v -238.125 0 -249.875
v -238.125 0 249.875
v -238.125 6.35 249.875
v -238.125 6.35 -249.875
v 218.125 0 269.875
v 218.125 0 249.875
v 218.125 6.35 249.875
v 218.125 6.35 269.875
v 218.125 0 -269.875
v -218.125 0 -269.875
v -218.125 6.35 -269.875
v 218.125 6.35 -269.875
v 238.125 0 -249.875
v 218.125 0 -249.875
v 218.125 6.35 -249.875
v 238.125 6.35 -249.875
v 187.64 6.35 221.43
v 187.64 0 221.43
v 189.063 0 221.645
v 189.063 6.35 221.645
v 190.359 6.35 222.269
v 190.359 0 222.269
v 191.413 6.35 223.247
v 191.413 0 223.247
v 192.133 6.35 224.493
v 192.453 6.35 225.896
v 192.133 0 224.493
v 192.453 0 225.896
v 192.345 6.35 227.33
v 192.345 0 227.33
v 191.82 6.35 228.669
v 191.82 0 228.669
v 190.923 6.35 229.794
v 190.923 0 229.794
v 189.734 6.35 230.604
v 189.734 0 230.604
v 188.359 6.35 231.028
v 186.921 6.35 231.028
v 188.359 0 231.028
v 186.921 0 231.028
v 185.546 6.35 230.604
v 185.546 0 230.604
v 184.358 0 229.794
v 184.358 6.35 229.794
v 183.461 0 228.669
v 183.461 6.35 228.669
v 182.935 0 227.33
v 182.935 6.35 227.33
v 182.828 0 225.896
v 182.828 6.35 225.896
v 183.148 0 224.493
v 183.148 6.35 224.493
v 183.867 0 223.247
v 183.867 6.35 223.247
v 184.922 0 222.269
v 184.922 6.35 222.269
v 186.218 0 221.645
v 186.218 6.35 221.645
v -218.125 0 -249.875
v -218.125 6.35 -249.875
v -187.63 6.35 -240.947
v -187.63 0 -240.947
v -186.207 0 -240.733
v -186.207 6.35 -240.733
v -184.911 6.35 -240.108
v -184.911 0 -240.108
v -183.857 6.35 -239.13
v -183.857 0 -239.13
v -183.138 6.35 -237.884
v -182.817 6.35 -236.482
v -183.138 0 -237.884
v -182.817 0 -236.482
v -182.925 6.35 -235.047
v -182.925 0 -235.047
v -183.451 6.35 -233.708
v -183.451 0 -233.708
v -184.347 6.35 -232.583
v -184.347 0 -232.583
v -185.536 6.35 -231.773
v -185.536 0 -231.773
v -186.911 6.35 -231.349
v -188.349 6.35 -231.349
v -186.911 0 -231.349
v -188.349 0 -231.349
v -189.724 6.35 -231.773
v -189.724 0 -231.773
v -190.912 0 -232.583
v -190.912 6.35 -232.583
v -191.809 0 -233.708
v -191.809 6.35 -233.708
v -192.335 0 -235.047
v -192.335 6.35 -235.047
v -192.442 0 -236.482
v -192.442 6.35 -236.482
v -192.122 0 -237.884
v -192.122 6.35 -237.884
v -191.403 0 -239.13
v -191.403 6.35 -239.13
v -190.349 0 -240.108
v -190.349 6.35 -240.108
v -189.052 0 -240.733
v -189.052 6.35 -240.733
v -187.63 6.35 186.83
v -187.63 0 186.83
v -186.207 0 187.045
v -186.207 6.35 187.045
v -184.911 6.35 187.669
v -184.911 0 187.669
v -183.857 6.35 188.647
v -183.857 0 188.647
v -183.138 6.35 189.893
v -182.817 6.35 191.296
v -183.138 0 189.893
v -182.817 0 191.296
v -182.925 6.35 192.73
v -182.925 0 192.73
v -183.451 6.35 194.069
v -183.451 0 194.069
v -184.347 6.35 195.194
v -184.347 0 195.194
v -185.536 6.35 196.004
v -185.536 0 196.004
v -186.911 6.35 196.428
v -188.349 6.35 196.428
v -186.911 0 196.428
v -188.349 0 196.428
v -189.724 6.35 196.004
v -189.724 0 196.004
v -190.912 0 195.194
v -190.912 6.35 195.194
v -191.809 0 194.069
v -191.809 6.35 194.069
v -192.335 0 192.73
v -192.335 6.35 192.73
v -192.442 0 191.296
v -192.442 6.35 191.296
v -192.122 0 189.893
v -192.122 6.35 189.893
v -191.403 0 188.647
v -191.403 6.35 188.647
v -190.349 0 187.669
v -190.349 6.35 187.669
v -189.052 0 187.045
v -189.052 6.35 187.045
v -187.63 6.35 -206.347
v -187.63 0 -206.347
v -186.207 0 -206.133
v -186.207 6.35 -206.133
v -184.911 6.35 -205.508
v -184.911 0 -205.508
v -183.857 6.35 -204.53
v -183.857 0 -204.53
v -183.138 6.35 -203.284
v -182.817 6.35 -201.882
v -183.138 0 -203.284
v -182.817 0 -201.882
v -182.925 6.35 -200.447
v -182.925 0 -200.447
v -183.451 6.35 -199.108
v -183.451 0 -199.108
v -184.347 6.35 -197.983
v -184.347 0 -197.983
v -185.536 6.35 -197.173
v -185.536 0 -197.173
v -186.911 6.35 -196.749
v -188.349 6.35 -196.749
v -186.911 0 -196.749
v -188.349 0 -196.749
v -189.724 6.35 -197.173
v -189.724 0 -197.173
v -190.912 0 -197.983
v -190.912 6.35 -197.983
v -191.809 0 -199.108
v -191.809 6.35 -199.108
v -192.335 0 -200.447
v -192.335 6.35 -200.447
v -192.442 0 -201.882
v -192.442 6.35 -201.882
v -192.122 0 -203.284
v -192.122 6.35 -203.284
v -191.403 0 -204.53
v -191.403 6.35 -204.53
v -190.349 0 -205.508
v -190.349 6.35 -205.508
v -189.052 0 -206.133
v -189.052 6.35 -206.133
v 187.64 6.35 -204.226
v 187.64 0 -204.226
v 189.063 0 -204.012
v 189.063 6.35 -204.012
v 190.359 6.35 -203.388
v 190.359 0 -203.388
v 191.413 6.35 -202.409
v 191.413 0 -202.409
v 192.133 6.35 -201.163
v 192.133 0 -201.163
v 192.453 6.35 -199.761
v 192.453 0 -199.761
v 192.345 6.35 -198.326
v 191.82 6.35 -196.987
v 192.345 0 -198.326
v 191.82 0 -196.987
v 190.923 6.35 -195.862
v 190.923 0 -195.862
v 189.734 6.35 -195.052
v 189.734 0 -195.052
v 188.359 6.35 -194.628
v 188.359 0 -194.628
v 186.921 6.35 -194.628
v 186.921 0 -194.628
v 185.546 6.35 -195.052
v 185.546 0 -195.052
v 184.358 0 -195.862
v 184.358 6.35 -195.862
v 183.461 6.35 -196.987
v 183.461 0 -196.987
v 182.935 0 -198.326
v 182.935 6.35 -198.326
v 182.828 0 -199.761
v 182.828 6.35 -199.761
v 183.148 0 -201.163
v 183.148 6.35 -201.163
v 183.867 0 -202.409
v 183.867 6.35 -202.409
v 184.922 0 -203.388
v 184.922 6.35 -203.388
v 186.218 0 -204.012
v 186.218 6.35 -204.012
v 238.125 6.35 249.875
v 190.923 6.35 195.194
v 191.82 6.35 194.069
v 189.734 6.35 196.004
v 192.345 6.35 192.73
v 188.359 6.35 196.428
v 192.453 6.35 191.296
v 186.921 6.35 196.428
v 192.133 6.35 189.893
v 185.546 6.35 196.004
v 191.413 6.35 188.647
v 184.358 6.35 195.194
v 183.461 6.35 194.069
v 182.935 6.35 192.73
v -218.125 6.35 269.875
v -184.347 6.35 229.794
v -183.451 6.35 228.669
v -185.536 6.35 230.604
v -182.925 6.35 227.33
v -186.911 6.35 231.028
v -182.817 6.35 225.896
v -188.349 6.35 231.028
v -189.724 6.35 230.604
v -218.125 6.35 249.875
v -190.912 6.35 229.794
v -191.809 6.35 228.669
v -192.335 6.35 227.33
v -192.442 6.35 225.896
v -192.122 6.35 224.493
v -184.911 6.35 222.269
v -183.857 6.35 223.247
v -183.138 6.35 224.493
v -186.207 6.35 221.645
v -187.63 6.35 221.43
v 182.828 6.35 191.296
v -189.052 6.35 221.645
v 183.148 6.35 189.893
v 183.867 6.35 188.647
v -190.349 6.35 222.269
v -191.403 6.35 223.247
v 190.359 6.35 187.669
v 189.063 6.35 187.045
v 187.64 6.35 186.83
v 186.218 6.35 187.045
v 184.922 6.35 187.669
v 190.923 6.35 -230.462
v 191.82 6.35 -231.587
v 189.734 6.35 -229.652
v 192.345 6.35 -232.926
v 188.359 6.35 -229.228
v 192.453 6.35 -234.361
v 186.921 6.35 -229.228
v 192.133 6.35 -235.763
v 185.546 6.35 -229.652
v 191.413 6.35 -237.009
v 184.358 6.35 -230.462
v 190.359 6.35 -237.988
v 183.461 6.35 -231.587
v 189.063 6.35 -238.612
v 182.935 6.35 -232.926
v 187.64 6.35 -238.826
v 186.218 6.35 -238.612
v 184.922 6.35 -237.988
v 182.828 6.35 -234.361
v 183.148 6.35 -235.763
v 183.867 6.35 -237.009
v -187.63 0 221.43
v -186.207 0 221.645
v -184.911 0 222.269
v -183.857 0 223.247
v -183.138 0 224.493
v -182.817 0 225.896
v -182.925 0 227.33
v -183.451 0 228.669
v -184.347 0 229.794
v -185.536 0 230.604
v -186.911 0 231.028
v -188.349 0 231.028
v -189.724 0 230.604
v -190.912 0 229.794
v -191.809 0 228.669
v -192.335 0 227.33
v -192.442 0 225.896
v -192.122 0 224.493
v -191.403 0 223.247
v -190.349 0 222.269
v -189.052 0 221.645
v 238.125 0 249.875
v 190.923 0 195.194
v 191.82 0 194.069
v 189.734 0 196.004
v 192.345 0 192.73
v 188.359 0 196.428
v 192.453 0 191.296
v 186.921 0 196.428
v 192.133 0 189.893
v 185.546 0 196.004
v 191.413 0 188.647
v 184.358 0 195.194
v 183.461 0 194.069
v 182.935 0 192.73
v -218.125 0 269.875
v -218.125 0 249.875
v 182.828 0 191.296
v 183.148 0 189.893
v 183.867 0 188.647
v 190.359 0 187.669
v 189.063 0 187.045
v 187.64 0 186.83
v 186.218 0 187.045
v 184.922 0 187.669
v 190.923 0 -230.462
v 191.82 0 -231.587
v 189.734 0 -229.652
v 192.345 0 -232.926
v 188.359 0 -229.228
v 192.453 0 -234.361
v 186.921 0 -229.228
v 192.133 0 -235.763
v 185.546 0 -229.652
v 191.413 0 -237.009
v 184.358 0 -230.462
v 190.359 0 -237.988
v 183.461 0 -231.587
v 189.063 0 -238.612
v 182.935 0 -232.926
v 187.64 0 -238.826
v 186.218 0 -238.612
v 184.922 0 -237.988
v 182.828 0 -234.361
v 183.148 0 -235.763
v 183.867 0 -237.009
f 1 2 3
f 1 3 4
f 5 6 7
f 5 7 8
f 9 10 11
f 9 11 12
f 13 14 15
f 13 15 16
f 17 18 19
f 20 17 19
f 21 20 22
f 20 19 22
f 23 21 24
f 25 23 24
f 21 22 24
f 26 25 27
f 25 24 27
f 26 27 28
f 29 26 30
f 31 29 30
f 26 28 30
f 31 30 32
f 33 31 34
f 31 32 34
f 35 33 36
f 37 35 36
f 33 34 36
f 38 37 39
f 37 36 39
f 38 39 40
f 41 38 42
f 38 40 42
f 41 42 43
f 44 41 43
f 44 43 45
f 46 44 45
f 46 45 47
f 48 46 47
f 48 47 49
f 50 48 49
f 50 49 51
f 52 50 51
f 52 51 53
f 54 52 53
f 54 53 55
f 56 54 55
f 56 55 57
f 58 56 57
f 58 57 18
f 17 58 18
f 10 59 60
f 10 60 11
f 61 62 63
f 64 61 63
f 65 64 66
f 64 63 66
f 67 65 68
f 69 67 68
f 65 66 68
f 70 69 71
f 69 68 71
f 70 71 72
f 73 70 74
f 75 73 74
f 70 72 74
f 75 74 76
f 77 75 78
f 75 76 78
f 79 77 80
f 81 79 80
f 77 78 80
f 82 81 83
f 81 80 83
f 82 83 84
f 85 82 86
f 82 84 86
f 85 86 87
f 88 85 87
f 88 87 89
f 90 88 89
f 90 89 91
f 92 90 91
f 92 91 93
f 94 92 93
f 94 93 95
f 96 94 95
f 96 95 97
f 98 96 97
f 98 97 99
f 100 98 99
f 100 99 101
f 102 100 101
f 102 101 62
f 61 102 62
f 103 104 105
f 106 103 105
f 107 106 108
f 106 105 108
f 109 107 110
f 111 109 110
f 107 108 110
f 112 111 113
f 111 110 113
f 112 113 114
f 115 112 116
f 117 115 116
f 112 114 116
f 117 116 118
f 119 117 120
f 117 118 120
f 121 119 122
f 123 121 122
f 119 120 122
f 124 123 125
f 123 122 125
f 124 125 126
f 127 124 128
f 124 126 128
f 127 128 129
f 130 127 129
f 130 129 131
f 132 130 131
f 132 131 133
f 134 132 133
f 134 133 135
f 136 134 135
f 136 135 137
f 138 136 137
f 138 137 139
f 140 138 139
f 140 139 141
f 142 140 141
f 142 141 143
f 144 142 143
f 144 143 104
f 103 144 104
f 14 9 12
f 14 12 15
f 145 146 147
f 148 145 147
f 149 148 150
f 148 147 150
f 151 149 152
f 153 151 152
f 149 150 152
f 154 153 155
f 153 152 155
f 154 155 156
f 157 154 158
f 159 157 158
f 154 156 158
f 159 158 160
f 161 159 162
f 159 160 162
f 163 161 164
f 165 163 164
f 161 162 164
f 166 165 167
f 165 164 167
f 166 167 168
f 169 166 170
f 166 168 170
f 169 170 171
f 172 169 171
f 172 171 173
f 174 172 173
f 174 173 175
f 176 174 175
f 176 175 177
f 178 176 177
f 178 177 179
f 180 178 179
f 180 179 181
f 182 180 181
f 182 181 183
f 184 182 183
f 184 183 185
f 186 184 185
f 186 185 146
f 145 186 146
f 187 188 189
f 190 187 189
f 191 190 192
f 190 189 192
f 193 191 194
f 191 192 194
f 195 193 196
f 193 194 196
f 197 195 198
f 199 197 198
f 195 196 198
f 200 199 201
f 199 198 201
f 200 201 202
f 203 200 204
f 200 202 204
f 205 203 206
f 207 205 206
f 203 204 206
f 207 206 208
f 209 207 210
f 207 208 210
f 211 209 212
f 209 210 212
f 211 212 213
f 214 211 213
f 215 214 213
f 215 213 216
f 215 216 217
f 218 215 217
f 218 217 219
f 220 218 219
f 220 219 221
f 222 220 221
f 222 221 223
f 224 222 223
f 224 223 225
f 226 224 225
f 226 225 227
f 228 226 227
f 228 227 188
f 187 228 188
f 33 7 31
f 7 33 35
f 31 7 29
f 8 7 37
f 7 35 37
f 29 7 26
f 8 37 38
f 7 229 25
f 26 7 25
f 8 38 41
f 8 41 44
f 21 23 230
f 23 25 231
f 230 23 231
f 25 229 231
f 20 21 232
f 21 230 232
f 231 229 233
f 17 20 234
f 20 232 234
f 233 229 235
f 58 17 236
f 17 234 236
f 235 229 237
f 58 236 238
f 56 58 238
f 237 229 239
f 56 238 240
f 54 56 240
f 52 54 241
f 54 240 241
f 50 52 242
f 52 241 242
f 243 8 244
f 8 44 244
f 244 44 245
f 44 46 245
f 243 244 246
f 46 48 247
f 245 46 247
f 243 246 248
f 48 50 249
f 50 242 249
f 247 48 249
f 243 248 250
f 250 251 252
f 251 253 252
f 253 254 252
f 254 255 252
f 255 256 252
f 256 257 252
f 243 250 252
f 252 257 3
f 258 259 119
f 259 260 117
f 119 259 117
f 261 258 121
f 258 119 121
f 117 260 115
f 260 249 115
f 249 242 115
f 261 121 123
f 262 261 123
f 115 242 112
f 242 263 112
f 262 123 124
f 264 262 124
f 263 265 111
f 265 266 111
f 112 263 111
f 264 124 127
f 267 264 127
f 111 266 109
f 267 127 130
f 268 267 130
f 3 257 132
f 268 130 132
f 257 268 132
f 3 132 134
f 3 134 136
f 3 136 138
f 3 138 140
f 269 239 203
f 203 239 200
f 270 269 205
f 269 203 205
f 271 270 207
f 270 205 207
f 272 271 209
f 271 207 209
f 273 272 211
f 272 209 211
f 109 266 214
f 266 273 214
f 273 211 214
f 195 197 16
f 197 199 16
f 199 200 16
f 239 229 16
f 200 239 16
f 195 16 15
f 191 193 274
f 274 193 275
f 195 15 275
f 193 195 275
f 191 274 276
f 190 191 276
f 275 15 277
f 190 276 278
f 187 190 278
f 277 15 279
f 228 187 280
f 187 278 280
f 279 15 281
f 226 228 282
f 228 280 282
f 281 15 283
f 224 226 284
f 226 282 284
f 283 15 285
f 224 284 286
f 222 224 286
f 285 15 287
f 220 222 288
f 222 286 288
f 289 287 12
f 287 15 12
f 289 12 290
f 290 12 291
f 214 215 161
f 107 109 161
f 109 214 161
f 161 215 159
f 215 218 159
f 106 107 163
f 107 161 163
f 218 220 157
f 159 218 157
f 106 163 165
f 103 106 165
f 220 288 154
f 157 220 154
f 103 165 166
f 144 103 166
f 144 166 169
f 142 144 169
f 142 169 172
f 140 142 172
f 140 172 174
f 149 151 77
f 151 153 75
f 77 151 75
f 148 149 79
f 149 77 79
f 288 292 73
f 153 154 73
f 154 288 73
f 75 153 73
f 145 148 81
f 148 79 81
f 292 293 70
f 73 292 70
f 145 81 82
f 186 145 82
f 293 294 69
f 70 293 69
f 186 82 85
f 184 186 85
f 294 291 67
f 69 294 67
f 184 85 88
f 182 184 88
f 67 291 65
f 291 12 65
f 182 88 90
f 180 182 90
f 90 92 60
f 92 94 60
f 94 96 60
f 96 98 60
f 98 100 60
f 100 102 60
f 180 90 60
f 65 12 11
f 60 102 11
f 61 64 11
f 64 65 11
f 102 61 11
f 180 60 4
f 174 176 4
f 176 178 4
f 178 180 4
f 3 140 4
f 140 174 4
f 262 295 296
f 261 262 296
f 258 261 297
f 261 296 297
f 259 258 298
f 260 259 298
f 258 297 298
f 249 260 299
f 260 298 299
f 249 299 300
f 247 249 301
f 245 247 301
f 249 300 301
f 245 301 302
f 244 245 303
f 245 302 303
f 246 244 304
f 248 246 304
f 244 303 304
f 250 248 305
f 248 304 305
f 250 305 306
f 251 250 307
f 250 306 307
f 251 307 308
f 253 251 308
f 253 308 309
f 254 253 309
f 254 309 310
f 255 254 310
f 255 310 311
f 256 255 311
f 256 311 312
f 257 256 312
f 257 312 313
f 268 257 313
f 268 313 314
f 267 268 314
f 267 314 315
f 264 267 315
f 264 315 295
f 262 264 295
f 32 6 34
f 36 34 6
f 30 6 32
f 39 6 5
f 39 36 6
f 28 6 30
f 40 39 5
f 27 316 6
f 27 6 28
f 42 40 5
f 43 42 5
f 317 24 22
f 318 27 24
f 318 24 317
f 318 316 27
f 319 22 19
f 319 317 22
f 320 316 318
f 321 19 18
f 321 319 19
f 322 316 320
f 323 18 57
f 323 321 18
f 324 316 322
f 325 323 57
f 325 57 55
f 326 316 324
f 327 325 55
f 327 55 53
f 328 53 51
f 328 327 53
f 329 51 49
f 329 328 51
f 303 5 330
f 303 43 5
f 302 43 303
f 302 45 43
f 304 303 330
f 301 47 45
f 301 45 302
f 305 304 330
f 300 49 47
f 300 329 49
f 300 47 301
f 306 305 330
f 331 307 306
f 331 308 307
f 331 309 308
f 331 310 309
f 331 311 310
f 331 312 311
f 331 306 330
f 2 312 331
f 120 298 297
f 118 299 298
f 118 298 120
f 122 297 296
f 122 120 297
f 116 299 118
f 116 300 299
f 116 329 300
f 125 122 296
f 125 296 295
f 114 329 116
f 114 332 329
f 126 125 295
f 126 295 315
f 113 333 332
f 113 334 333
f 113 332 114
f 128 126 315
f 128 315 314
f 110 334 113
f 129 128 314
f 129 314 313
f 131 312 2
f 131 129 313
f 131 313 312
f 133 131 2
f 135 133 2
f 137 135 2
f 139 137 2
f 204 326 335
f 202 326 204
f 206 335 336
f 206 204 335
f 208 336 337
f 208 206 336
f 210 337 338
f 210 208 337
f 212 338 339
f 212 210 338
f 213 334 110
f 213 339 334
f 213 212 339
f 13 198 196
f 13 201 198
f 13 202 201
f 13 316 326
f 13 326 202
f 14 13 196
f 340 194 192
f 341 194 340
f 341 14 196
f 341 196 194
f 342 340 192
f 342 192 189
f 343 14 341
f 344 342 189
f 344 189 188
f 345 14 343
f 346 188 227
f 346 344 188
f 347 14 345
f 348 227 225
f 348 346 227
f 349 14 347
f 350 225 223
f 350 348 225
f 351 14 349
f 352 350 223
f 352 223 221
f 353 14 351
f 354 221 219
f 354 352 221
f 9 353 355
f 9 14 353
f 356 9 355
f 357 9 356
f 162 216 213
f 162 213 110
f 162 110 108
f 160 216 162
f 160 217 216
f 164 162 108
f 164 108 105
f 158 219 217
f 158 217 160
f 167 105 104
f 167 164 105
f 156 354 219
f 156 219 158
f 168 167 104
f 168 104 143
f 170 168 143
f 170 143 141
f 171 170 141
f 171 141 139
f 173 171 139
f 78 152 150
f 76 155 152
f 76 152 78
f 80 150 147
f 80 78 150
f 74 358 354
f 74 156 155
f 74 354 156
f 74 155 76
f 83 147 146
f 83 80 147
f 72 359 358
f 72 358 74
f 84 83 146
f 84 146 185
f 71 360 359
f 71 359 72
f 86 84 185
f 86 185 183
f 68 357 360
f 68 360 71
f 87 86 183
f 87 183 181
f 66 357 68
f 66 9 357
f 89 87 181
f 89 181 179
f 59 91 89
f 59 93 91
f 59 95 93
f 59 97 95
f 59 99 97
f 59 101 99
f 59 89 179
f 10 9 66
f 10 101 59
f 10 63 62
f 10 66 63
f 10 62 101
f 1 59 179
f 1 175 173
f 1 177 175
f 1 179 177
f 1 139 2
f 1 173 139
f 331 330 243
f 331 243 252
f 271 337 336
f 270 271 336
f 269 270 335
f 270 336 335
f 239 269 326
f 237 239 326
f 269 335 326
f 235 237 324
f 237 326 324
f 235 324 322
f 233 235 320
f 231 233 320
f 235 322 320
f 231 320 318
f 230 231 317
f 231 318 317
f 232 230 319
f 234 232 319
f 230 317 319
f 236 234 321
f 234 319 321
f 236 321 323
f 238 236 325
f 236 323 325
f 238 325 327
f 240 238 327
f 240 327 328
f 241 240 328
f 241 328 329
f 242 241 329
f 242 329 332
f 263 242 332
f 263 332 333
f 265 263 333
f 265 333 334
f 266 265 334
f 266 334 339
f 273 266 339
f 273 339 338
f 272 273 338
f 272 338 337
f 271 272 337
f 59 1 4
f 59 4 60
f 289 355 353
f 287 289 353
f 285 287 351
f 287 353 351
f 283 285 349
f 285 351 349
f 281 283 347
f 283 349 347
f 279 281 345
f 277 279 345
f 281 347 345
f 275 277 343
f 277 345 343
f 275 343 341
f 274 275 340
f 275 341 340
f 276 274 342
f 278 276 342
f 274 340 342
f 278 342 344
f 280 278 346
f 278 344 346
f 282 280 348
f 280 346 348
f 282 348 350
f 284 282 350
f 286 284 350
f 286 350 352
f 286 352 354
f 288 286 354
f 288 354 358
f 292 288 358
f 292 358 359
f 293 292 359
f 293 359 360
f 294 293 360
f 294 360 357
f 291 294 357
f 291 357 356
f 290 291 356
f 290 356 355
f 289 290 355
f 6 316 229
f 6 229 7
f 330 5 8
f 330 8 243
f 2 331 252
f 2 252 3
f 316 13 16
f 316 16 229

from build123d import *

# Parameters (mm, degrees)
BOSS_EXTRUDE4_DEPTH = 6.35
SKETCH4_R           = 4.826
CUT_EXTRUDE1_DEPTH  = 109.474
SKETCH5_R           = 4.826
CUT_EXTRUDE2_DEPTH  = 42.164
SKETCH6_R           = 4.826
CUT_EXTRUDE3_DEPTH  = 90.932
SKETCH7_R           = 4.826
CUT_EXTRUDE4_DEPTH  = 90.932


with BuildPart() as part:
    # Sketch1 → Boss-Extrude4 (new body)
    with BuildSketch(Plane(origin=(0, 0, 0), x_dir=(1, 0, 0), z_dir=(0, 1, 0))):
        Polygon((-218.125, 269.875), (218.125, 269.875), (218.125, 249.875), (238.125, 249.875), (238.125, -249.875), (218.125, -249.875), (218.125, -269.875), (-218.125, -269.875), (-218.125, -249.875), (-238.125, -249.875), (-238.125, 249.875), (-218.125, 249.875), align=None)
    extrude(amount=BOSS_EXTRUDE4_DEPTH)

    # Sketch4 → Cut-Extrude1 (cut)
    with BuildSketch(Plane(origin=(-189.734229067, -3, -427.845388044), x_dir=(1, 0, 0), z_dir=(0, -1, 0))):
        with Locations(Location((2.104243746, 226.324422281, 0), (0, 0, 270))):
            Circle(SKETCH4_R)
        with Locations(Location((2.104243746, 191.724422281, 0), (0, 0, 270))):
            Circle(SKETCH4_R)
    extrude(amount=-CUT_EXTRUDE1_DEPTH, mode=Mode.SUBTRACT)

    # Sketch5 → Cut-Extrude2 (cut)
    with BuildSketch(Plane(origin=(-189.734229067, 0, -427.845388044), x_dir=(-1, 0, 0), z_dir=(0, -1, 0))):
        with Locations(Location((-377.374414389, -228.445283948, 0), (0, 0, 90))):
            Circle(SKETCH5_R)
        with Locations(Location((-377.374414389, -193.845283948, 0), (0, 0, 90))):
            Circle(SKETCH5_R)
    extrude(amount=-CUT_EXTRUDE2_DEPTH, mode=Mode.SUBTRACT)

    # Sketch6 → Cut-Extrude3 (cut)
    with BuildSketch(Plane(origin=(-189.734229067, -3, -427.845388044), x_dir=(1, 0, 0), z_dir=(0, -1, 0))):
        with Locations(Location((2.104243746, 654.101705956, 0), (0, 0, 270))):
            Circle(SKETCH6_R)
        with Locations(Location((2.104243746, 619.501705956, 0), (0, 0, 270))):
            Circle(SKETCH6_R)
    extrude(amount=-CUT_EXTRUDE3_DEPTH, mode=Mode.SUBTRACT)

    # Sketch7 → Cut-Extrude4 (cut)
    with BuildSketch(Plane(origin=(-189.734229067, -3, -427.845388044), x_dir=(1, 0, 0), z_dir=(0, -1, 0))):
        with Locations(Location((377.374414389, 654.101705956, 0), (0, 0, 270))):
            Circle(SKETCH7_R)
        with Locations(Location((377.374414389, 619.501705956, 0), (0, 0, 270))):
            Circle(SKETCH7_R)
    extrude(amount=-CUT_EXTRUDE4_DEPTH, mode=Mode.SUBTRACT)


solid = part.part
